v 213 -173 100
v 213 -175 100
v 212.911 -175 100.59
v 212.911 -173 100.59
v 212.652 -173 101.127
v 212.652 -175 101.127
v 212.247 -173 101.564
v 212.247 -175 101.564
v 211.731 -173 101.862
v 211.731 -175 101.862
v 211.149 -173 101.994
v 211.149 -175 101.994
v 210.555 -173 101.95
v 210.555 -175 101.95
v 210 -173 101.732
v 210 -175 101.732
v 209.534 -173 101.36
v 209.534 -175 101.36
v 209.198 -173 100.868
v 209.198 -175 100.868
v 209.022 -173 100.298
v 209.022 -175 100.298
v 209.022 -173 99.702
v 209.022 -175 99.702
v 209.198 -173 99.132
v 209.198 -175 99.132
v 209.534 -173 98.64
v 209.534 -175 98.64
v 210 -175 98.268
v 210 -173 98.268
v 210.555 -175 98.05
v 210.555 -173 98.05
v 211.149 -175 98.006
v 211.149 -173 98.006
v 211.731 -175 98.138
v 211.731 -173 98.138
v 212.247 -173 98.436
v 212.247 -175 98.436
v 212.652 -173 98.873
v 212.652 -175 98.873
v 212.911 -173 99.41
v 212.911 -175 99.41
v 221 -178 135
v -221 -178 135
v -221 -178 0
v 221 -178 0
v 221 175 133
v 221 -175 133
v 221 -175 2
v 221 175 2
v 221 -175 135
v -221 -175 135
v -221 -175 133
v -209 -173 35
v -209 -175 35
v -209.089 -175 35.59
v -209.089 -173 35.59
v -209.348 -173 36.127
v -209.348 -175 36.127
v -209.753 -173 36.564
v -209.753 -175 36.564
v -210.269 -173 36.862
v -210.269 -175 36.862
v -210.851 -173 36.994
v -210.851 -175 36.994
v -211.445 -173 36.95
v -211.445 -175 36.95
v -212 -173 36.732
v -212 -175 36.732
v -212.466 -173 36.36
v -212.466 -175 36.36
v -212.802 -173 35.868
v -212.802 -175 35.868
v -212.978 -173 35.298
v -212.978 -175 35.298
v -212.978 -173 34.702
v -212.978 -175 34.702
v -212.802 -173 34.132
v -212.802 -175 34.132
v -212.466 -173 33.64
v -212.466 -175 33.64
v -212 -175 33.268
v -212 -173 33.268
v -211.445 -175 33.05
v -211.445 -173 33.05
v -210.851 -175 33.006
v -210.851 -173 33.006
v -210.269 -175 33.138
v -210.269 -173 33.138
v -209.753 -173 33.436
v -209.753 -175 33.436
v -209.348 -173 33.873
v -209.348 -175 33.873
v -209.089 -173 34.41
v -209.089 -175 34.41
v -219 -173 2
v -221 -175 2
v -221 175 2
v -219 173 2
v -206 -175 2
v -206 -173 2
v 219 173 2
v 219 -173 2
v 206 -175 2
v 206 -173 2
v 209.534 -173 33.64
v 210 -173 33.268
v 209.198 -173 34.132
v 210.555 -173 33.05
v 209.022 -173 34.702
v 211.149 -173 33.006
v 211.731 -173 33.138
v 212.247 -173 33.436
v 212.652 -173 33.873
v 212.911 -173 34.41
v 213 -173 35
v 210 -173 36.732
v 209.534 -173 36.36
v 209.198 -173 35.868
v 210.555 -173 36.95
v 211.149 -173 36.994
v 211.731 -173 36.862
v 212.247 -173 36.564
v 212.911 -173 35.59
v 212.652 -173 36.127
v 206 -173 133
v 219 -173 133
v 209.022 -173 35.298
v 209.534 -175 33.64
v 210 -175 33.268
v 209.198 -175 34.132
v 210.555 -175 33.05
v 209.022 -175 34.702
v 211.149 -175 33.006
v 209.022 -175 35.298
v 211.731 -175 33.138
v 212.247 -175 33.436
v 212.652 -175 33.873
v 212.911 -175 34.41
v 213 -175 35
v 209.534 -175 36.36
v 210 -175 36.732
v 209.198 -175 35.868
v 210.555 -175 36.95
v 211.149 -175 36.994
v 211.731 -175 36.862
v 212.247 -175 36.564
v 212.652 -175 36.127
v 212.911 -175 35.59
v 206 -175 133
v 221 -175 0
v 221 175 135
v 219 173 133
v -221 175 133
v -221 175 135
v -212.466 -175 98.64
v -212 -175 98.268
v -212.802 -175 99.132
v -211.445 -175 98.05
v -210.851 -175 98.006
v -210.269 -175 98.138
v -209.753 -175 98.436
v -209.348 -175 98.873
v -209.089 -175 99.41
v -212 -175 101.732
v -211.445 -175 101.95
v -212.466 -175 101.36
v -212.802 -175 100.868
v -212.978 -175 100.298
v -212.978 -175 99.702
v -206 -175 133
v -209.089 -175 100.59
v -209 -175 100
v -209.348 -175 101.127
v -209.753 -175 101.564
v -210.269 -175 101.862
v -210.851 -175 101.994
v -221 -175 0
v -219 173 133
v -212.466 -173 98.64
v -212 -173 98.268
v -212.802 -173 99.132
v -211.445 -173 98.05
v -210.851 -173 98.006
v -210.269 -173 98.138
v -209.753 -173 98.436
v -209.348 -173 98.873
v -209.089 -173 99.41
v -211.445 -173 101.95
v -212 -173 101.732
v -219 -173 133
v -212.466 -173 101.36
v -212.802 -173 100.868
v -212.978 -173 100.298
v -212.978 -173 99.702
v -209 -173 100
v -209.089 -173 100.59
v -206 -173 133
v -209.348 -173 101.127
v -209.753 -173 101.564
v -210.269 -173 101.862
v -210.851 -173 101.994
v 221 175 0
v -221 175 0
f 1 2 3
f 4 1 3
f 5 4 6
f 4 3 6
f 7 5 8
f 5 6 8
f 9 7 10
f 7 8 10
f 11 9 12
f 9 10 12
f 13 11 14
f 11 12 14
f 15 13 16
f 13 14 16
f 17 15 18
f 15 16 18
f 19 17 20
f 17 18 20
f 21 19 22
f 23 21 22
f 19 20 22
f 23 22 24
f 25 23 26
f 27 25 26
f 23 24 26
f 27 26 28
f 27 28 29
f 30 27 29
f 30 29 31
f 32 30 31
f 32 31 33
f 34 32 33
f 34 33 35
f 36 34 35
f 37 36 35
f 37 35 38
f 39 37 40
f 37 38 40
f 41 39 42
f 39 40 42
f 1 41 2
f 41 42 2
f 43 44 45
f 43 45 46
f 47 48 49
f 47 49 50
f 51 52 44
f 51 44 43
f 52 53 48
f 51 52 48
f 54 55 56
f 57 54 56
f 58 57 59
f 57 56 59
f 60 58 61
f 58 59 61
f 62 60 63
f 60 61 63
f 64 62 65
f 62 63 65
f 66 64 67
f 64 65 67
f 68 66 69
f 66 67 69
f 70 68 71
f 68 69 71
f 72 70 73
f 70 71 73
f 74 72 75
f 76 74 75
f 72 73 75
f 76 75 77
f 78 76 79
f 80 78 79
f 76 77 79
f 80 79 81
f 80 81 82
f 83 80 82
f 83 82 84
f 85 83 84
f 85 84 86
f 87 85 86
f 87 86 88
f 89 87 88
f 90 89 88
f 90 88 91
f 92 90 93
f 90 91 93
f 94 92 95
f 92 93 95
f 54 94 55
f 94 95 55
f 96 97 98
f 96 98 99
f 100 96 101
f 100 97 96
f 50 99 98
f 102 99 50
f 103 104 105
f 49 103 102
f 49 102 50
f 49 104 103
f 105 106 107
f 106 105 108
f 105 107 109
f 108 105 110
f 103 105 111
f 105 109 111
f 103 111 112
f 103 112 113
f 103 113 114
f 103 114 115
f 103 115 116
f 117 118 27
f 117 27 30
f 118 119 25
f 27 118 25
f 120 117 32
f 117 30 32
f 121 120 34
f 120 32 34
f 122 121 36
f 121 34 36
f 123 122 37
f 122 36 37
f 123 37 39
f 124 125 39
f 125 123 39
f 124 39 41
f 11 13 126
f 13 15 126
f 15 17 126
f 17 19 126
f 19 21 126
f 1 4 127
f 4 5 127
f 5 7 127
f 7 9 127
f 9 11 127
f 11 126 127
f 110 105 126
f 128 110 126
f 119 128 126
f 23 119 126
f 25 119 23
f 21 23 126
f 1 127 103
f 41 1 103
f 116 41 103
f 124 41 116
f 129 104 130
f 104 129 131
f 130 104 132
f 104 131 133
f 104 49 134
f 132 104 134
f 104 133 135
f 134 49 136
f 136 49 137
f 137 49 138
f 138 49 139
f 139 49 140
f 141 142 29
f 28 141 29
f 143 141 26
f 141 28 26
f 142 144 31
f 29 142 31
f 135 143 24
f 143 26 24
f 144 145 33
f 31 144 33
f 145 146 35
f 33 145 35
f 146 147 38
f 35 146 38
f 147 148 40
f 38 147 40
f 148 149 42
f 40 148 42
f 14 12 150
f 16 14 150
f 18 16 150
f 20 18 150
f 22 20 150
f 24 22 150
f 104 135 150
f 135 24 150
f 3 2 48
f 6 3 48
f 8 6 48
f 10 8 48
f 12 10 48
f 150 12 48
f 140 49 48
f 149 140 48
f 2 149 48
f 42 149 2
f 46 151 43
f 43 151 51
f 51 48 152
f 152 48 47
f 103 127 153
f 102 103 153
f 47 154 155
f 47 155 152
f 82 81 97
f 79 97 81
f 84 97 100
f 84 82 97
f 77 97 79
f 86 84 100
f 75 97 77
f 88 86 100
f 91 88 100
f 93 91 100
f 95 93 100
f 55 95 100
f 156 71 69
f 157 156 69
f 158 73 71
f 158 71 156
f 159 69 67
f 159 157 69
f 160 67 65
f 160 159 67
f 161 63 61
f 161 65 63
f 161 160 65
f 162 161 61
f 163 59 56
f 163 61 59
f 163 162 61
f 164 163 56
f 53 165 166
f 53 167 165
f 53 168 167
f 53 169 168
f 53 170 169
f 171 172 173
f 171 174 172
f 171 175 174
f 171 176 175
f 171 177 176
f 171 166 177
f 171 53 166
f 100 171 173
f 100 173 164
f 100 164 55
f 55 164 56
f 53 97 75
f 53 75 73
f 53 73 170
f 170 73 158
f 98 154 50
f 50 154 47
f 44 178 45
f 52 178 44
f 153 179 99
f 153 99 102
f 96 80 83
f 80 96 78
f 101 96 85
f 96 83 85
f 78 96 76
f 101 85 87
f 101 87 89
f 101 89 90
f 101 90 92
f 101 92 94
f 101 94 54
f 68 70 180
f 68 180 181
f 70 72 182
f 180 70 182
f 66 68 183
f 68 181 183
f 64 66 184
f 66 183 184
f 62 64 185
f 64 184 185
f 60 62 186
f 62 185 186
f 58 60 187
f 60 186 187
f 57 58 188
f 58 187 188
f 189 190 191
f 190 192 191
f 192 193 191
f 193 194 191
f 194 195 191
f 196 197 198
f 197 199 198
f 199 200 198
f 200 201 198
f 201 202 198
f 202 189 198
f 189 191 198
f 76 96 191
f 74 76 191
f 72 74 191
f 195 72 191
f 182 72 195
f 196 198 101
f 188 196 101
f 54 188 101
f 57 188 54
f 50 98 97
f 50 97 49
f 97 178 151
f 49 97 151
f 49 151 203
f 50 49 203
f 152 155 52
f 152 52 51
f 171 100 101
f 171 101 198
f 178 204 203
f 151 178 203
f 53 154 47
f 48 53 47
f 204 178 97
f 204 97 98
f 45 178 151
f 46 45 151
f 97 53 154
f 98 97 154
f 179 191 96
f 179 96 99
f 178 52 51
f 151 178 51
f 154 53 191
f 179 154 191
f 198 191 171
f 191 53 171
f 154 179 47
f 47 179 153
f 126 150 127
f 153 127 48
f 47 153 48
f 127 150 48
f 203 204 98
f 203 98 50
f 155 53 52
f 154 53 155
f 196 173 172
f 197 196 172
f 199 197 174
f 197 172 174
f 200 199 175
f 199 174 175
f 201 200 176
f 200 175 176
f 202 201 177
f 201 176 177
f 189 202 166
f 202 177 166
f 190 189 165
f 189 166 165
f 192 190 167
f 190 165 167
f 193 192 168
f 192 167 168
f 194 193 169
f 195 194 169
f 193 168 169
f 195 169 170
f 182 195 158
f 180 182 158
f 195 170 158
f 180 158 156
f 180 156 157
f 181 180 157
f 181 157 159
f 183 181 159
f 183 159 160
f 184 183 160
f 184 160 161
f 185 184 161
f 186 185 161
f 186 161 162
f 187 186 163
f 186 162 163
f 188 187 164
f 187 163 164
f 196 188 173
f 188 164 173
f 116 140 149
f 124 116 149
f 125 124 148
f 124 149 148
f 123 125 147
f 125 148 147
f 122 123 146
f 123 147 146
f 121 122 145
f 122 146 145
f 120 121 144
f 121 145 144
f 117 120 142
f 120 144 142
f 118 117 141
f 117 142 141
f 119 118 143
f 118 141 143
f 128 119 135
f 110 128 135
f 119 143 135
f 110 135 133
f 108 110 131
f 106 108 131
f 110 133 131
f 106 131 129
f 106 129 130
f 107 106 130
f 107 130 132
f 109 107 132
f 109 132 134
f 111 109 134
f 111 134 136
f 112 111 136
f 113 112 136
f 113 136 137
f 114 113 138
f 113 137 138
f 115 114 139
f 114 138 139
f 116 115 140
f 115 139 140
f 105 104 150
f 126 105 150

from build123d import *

# Parameters (mm, degrees)
F4_W      = 442
F4_H      = 350
F7_DEPTH  = 2
F0_W      = 442
F0_H      = 350
F8_DEPTH  = 2
F9_W      = 442
F9_H      = 131
F10_DEPTH = 2
F11_W     = 348
F11_H     = 131
F12_DEPTH = 2
F13_W     = 348
F13_H     = 131
F14_DEPTH = 2
F15_W     = 13
F15_H     = 131
F15_R     = 2
F16_DEPTH = 2
F17_W     = 442
F17_H     = 135
F18_DEPTH = 3


with BuildPart() as f7:
    # F4 (on offset) → F7 (new body)
    with BuildSketch(Plane.XY.offset(133)):
        Rectangle(F4_W, F4_H)
    extrude(amount=F7_DEPTH)


with BuildPart() as f8:
    # F0 (on Top) → F8 (new body)
    with BuildSketch(Plane.XY):
        Rectangle(F0_W, F0_H)
    extrude(amount=F8_DEPTH)


with BuildPart() as f10:
    # F9 (on offset) → F10 (new body)
    with BuildSketch(Plane.XZ.offset(-175)):
        with Locations((0, 67.5)):
            Rectangle(F9_W, F9_H)
    extrude(amount=F10_DEPTH)

    # F11 (on offset) → F12 (join)
    with BuildSketch(Plane.YZ.offset(-221)):
        with Locations((-1, 67.5)):
            Rectangle(F11_W, F11_H)
    extrude(amount=F12_DEPTH)

    # F13 (on offset) → F14 (join)
    with BuildSketch(Plane.YZ.offset(221)):
        with Locations((-1, 67.5)):
            Rectangle(F13_W, F13_H)
    extrude(amount=-F14_DEPTH)

    # F15 (on offset) → F16 (join)
    with BuildSketch(Plane.XZ.offset(175)):
        with Locations((-212.5, 67.5)):
            Rectangle(F15_W, F15_H)
        with Locations((-211, 35)):
            Circle(F15_R, mode=Mode.SUBTRACT)
        with Locations((-211, 100)):
            Circle(F15_R, mode=Mode.SUBTRACT)
        with Locations((212.5, 67.5)):
            Rectangle(F15_W, F15_H)
        with Locations((211, 35)):
            Circle(F15_R, mode=Mode.SUBTRACT)
        with Locations((211, 100)):
            Circle(F15_R, mode=Mode.SUBTRACT)
    extrude(amount=-F16_DEPTH)


with BuildPart() as f18:
    # F17 (on offset) → F18 (new body)
    with BuildSketch(Plane.XZ.offset(175)):
        with Locations((0, 67.5)):
            Rectangle(F17_W, F17_H)
    extrude(amount=F18_DEPTH)


solid = Compound([f7.part, f8.part, f10.part, f18.part])
